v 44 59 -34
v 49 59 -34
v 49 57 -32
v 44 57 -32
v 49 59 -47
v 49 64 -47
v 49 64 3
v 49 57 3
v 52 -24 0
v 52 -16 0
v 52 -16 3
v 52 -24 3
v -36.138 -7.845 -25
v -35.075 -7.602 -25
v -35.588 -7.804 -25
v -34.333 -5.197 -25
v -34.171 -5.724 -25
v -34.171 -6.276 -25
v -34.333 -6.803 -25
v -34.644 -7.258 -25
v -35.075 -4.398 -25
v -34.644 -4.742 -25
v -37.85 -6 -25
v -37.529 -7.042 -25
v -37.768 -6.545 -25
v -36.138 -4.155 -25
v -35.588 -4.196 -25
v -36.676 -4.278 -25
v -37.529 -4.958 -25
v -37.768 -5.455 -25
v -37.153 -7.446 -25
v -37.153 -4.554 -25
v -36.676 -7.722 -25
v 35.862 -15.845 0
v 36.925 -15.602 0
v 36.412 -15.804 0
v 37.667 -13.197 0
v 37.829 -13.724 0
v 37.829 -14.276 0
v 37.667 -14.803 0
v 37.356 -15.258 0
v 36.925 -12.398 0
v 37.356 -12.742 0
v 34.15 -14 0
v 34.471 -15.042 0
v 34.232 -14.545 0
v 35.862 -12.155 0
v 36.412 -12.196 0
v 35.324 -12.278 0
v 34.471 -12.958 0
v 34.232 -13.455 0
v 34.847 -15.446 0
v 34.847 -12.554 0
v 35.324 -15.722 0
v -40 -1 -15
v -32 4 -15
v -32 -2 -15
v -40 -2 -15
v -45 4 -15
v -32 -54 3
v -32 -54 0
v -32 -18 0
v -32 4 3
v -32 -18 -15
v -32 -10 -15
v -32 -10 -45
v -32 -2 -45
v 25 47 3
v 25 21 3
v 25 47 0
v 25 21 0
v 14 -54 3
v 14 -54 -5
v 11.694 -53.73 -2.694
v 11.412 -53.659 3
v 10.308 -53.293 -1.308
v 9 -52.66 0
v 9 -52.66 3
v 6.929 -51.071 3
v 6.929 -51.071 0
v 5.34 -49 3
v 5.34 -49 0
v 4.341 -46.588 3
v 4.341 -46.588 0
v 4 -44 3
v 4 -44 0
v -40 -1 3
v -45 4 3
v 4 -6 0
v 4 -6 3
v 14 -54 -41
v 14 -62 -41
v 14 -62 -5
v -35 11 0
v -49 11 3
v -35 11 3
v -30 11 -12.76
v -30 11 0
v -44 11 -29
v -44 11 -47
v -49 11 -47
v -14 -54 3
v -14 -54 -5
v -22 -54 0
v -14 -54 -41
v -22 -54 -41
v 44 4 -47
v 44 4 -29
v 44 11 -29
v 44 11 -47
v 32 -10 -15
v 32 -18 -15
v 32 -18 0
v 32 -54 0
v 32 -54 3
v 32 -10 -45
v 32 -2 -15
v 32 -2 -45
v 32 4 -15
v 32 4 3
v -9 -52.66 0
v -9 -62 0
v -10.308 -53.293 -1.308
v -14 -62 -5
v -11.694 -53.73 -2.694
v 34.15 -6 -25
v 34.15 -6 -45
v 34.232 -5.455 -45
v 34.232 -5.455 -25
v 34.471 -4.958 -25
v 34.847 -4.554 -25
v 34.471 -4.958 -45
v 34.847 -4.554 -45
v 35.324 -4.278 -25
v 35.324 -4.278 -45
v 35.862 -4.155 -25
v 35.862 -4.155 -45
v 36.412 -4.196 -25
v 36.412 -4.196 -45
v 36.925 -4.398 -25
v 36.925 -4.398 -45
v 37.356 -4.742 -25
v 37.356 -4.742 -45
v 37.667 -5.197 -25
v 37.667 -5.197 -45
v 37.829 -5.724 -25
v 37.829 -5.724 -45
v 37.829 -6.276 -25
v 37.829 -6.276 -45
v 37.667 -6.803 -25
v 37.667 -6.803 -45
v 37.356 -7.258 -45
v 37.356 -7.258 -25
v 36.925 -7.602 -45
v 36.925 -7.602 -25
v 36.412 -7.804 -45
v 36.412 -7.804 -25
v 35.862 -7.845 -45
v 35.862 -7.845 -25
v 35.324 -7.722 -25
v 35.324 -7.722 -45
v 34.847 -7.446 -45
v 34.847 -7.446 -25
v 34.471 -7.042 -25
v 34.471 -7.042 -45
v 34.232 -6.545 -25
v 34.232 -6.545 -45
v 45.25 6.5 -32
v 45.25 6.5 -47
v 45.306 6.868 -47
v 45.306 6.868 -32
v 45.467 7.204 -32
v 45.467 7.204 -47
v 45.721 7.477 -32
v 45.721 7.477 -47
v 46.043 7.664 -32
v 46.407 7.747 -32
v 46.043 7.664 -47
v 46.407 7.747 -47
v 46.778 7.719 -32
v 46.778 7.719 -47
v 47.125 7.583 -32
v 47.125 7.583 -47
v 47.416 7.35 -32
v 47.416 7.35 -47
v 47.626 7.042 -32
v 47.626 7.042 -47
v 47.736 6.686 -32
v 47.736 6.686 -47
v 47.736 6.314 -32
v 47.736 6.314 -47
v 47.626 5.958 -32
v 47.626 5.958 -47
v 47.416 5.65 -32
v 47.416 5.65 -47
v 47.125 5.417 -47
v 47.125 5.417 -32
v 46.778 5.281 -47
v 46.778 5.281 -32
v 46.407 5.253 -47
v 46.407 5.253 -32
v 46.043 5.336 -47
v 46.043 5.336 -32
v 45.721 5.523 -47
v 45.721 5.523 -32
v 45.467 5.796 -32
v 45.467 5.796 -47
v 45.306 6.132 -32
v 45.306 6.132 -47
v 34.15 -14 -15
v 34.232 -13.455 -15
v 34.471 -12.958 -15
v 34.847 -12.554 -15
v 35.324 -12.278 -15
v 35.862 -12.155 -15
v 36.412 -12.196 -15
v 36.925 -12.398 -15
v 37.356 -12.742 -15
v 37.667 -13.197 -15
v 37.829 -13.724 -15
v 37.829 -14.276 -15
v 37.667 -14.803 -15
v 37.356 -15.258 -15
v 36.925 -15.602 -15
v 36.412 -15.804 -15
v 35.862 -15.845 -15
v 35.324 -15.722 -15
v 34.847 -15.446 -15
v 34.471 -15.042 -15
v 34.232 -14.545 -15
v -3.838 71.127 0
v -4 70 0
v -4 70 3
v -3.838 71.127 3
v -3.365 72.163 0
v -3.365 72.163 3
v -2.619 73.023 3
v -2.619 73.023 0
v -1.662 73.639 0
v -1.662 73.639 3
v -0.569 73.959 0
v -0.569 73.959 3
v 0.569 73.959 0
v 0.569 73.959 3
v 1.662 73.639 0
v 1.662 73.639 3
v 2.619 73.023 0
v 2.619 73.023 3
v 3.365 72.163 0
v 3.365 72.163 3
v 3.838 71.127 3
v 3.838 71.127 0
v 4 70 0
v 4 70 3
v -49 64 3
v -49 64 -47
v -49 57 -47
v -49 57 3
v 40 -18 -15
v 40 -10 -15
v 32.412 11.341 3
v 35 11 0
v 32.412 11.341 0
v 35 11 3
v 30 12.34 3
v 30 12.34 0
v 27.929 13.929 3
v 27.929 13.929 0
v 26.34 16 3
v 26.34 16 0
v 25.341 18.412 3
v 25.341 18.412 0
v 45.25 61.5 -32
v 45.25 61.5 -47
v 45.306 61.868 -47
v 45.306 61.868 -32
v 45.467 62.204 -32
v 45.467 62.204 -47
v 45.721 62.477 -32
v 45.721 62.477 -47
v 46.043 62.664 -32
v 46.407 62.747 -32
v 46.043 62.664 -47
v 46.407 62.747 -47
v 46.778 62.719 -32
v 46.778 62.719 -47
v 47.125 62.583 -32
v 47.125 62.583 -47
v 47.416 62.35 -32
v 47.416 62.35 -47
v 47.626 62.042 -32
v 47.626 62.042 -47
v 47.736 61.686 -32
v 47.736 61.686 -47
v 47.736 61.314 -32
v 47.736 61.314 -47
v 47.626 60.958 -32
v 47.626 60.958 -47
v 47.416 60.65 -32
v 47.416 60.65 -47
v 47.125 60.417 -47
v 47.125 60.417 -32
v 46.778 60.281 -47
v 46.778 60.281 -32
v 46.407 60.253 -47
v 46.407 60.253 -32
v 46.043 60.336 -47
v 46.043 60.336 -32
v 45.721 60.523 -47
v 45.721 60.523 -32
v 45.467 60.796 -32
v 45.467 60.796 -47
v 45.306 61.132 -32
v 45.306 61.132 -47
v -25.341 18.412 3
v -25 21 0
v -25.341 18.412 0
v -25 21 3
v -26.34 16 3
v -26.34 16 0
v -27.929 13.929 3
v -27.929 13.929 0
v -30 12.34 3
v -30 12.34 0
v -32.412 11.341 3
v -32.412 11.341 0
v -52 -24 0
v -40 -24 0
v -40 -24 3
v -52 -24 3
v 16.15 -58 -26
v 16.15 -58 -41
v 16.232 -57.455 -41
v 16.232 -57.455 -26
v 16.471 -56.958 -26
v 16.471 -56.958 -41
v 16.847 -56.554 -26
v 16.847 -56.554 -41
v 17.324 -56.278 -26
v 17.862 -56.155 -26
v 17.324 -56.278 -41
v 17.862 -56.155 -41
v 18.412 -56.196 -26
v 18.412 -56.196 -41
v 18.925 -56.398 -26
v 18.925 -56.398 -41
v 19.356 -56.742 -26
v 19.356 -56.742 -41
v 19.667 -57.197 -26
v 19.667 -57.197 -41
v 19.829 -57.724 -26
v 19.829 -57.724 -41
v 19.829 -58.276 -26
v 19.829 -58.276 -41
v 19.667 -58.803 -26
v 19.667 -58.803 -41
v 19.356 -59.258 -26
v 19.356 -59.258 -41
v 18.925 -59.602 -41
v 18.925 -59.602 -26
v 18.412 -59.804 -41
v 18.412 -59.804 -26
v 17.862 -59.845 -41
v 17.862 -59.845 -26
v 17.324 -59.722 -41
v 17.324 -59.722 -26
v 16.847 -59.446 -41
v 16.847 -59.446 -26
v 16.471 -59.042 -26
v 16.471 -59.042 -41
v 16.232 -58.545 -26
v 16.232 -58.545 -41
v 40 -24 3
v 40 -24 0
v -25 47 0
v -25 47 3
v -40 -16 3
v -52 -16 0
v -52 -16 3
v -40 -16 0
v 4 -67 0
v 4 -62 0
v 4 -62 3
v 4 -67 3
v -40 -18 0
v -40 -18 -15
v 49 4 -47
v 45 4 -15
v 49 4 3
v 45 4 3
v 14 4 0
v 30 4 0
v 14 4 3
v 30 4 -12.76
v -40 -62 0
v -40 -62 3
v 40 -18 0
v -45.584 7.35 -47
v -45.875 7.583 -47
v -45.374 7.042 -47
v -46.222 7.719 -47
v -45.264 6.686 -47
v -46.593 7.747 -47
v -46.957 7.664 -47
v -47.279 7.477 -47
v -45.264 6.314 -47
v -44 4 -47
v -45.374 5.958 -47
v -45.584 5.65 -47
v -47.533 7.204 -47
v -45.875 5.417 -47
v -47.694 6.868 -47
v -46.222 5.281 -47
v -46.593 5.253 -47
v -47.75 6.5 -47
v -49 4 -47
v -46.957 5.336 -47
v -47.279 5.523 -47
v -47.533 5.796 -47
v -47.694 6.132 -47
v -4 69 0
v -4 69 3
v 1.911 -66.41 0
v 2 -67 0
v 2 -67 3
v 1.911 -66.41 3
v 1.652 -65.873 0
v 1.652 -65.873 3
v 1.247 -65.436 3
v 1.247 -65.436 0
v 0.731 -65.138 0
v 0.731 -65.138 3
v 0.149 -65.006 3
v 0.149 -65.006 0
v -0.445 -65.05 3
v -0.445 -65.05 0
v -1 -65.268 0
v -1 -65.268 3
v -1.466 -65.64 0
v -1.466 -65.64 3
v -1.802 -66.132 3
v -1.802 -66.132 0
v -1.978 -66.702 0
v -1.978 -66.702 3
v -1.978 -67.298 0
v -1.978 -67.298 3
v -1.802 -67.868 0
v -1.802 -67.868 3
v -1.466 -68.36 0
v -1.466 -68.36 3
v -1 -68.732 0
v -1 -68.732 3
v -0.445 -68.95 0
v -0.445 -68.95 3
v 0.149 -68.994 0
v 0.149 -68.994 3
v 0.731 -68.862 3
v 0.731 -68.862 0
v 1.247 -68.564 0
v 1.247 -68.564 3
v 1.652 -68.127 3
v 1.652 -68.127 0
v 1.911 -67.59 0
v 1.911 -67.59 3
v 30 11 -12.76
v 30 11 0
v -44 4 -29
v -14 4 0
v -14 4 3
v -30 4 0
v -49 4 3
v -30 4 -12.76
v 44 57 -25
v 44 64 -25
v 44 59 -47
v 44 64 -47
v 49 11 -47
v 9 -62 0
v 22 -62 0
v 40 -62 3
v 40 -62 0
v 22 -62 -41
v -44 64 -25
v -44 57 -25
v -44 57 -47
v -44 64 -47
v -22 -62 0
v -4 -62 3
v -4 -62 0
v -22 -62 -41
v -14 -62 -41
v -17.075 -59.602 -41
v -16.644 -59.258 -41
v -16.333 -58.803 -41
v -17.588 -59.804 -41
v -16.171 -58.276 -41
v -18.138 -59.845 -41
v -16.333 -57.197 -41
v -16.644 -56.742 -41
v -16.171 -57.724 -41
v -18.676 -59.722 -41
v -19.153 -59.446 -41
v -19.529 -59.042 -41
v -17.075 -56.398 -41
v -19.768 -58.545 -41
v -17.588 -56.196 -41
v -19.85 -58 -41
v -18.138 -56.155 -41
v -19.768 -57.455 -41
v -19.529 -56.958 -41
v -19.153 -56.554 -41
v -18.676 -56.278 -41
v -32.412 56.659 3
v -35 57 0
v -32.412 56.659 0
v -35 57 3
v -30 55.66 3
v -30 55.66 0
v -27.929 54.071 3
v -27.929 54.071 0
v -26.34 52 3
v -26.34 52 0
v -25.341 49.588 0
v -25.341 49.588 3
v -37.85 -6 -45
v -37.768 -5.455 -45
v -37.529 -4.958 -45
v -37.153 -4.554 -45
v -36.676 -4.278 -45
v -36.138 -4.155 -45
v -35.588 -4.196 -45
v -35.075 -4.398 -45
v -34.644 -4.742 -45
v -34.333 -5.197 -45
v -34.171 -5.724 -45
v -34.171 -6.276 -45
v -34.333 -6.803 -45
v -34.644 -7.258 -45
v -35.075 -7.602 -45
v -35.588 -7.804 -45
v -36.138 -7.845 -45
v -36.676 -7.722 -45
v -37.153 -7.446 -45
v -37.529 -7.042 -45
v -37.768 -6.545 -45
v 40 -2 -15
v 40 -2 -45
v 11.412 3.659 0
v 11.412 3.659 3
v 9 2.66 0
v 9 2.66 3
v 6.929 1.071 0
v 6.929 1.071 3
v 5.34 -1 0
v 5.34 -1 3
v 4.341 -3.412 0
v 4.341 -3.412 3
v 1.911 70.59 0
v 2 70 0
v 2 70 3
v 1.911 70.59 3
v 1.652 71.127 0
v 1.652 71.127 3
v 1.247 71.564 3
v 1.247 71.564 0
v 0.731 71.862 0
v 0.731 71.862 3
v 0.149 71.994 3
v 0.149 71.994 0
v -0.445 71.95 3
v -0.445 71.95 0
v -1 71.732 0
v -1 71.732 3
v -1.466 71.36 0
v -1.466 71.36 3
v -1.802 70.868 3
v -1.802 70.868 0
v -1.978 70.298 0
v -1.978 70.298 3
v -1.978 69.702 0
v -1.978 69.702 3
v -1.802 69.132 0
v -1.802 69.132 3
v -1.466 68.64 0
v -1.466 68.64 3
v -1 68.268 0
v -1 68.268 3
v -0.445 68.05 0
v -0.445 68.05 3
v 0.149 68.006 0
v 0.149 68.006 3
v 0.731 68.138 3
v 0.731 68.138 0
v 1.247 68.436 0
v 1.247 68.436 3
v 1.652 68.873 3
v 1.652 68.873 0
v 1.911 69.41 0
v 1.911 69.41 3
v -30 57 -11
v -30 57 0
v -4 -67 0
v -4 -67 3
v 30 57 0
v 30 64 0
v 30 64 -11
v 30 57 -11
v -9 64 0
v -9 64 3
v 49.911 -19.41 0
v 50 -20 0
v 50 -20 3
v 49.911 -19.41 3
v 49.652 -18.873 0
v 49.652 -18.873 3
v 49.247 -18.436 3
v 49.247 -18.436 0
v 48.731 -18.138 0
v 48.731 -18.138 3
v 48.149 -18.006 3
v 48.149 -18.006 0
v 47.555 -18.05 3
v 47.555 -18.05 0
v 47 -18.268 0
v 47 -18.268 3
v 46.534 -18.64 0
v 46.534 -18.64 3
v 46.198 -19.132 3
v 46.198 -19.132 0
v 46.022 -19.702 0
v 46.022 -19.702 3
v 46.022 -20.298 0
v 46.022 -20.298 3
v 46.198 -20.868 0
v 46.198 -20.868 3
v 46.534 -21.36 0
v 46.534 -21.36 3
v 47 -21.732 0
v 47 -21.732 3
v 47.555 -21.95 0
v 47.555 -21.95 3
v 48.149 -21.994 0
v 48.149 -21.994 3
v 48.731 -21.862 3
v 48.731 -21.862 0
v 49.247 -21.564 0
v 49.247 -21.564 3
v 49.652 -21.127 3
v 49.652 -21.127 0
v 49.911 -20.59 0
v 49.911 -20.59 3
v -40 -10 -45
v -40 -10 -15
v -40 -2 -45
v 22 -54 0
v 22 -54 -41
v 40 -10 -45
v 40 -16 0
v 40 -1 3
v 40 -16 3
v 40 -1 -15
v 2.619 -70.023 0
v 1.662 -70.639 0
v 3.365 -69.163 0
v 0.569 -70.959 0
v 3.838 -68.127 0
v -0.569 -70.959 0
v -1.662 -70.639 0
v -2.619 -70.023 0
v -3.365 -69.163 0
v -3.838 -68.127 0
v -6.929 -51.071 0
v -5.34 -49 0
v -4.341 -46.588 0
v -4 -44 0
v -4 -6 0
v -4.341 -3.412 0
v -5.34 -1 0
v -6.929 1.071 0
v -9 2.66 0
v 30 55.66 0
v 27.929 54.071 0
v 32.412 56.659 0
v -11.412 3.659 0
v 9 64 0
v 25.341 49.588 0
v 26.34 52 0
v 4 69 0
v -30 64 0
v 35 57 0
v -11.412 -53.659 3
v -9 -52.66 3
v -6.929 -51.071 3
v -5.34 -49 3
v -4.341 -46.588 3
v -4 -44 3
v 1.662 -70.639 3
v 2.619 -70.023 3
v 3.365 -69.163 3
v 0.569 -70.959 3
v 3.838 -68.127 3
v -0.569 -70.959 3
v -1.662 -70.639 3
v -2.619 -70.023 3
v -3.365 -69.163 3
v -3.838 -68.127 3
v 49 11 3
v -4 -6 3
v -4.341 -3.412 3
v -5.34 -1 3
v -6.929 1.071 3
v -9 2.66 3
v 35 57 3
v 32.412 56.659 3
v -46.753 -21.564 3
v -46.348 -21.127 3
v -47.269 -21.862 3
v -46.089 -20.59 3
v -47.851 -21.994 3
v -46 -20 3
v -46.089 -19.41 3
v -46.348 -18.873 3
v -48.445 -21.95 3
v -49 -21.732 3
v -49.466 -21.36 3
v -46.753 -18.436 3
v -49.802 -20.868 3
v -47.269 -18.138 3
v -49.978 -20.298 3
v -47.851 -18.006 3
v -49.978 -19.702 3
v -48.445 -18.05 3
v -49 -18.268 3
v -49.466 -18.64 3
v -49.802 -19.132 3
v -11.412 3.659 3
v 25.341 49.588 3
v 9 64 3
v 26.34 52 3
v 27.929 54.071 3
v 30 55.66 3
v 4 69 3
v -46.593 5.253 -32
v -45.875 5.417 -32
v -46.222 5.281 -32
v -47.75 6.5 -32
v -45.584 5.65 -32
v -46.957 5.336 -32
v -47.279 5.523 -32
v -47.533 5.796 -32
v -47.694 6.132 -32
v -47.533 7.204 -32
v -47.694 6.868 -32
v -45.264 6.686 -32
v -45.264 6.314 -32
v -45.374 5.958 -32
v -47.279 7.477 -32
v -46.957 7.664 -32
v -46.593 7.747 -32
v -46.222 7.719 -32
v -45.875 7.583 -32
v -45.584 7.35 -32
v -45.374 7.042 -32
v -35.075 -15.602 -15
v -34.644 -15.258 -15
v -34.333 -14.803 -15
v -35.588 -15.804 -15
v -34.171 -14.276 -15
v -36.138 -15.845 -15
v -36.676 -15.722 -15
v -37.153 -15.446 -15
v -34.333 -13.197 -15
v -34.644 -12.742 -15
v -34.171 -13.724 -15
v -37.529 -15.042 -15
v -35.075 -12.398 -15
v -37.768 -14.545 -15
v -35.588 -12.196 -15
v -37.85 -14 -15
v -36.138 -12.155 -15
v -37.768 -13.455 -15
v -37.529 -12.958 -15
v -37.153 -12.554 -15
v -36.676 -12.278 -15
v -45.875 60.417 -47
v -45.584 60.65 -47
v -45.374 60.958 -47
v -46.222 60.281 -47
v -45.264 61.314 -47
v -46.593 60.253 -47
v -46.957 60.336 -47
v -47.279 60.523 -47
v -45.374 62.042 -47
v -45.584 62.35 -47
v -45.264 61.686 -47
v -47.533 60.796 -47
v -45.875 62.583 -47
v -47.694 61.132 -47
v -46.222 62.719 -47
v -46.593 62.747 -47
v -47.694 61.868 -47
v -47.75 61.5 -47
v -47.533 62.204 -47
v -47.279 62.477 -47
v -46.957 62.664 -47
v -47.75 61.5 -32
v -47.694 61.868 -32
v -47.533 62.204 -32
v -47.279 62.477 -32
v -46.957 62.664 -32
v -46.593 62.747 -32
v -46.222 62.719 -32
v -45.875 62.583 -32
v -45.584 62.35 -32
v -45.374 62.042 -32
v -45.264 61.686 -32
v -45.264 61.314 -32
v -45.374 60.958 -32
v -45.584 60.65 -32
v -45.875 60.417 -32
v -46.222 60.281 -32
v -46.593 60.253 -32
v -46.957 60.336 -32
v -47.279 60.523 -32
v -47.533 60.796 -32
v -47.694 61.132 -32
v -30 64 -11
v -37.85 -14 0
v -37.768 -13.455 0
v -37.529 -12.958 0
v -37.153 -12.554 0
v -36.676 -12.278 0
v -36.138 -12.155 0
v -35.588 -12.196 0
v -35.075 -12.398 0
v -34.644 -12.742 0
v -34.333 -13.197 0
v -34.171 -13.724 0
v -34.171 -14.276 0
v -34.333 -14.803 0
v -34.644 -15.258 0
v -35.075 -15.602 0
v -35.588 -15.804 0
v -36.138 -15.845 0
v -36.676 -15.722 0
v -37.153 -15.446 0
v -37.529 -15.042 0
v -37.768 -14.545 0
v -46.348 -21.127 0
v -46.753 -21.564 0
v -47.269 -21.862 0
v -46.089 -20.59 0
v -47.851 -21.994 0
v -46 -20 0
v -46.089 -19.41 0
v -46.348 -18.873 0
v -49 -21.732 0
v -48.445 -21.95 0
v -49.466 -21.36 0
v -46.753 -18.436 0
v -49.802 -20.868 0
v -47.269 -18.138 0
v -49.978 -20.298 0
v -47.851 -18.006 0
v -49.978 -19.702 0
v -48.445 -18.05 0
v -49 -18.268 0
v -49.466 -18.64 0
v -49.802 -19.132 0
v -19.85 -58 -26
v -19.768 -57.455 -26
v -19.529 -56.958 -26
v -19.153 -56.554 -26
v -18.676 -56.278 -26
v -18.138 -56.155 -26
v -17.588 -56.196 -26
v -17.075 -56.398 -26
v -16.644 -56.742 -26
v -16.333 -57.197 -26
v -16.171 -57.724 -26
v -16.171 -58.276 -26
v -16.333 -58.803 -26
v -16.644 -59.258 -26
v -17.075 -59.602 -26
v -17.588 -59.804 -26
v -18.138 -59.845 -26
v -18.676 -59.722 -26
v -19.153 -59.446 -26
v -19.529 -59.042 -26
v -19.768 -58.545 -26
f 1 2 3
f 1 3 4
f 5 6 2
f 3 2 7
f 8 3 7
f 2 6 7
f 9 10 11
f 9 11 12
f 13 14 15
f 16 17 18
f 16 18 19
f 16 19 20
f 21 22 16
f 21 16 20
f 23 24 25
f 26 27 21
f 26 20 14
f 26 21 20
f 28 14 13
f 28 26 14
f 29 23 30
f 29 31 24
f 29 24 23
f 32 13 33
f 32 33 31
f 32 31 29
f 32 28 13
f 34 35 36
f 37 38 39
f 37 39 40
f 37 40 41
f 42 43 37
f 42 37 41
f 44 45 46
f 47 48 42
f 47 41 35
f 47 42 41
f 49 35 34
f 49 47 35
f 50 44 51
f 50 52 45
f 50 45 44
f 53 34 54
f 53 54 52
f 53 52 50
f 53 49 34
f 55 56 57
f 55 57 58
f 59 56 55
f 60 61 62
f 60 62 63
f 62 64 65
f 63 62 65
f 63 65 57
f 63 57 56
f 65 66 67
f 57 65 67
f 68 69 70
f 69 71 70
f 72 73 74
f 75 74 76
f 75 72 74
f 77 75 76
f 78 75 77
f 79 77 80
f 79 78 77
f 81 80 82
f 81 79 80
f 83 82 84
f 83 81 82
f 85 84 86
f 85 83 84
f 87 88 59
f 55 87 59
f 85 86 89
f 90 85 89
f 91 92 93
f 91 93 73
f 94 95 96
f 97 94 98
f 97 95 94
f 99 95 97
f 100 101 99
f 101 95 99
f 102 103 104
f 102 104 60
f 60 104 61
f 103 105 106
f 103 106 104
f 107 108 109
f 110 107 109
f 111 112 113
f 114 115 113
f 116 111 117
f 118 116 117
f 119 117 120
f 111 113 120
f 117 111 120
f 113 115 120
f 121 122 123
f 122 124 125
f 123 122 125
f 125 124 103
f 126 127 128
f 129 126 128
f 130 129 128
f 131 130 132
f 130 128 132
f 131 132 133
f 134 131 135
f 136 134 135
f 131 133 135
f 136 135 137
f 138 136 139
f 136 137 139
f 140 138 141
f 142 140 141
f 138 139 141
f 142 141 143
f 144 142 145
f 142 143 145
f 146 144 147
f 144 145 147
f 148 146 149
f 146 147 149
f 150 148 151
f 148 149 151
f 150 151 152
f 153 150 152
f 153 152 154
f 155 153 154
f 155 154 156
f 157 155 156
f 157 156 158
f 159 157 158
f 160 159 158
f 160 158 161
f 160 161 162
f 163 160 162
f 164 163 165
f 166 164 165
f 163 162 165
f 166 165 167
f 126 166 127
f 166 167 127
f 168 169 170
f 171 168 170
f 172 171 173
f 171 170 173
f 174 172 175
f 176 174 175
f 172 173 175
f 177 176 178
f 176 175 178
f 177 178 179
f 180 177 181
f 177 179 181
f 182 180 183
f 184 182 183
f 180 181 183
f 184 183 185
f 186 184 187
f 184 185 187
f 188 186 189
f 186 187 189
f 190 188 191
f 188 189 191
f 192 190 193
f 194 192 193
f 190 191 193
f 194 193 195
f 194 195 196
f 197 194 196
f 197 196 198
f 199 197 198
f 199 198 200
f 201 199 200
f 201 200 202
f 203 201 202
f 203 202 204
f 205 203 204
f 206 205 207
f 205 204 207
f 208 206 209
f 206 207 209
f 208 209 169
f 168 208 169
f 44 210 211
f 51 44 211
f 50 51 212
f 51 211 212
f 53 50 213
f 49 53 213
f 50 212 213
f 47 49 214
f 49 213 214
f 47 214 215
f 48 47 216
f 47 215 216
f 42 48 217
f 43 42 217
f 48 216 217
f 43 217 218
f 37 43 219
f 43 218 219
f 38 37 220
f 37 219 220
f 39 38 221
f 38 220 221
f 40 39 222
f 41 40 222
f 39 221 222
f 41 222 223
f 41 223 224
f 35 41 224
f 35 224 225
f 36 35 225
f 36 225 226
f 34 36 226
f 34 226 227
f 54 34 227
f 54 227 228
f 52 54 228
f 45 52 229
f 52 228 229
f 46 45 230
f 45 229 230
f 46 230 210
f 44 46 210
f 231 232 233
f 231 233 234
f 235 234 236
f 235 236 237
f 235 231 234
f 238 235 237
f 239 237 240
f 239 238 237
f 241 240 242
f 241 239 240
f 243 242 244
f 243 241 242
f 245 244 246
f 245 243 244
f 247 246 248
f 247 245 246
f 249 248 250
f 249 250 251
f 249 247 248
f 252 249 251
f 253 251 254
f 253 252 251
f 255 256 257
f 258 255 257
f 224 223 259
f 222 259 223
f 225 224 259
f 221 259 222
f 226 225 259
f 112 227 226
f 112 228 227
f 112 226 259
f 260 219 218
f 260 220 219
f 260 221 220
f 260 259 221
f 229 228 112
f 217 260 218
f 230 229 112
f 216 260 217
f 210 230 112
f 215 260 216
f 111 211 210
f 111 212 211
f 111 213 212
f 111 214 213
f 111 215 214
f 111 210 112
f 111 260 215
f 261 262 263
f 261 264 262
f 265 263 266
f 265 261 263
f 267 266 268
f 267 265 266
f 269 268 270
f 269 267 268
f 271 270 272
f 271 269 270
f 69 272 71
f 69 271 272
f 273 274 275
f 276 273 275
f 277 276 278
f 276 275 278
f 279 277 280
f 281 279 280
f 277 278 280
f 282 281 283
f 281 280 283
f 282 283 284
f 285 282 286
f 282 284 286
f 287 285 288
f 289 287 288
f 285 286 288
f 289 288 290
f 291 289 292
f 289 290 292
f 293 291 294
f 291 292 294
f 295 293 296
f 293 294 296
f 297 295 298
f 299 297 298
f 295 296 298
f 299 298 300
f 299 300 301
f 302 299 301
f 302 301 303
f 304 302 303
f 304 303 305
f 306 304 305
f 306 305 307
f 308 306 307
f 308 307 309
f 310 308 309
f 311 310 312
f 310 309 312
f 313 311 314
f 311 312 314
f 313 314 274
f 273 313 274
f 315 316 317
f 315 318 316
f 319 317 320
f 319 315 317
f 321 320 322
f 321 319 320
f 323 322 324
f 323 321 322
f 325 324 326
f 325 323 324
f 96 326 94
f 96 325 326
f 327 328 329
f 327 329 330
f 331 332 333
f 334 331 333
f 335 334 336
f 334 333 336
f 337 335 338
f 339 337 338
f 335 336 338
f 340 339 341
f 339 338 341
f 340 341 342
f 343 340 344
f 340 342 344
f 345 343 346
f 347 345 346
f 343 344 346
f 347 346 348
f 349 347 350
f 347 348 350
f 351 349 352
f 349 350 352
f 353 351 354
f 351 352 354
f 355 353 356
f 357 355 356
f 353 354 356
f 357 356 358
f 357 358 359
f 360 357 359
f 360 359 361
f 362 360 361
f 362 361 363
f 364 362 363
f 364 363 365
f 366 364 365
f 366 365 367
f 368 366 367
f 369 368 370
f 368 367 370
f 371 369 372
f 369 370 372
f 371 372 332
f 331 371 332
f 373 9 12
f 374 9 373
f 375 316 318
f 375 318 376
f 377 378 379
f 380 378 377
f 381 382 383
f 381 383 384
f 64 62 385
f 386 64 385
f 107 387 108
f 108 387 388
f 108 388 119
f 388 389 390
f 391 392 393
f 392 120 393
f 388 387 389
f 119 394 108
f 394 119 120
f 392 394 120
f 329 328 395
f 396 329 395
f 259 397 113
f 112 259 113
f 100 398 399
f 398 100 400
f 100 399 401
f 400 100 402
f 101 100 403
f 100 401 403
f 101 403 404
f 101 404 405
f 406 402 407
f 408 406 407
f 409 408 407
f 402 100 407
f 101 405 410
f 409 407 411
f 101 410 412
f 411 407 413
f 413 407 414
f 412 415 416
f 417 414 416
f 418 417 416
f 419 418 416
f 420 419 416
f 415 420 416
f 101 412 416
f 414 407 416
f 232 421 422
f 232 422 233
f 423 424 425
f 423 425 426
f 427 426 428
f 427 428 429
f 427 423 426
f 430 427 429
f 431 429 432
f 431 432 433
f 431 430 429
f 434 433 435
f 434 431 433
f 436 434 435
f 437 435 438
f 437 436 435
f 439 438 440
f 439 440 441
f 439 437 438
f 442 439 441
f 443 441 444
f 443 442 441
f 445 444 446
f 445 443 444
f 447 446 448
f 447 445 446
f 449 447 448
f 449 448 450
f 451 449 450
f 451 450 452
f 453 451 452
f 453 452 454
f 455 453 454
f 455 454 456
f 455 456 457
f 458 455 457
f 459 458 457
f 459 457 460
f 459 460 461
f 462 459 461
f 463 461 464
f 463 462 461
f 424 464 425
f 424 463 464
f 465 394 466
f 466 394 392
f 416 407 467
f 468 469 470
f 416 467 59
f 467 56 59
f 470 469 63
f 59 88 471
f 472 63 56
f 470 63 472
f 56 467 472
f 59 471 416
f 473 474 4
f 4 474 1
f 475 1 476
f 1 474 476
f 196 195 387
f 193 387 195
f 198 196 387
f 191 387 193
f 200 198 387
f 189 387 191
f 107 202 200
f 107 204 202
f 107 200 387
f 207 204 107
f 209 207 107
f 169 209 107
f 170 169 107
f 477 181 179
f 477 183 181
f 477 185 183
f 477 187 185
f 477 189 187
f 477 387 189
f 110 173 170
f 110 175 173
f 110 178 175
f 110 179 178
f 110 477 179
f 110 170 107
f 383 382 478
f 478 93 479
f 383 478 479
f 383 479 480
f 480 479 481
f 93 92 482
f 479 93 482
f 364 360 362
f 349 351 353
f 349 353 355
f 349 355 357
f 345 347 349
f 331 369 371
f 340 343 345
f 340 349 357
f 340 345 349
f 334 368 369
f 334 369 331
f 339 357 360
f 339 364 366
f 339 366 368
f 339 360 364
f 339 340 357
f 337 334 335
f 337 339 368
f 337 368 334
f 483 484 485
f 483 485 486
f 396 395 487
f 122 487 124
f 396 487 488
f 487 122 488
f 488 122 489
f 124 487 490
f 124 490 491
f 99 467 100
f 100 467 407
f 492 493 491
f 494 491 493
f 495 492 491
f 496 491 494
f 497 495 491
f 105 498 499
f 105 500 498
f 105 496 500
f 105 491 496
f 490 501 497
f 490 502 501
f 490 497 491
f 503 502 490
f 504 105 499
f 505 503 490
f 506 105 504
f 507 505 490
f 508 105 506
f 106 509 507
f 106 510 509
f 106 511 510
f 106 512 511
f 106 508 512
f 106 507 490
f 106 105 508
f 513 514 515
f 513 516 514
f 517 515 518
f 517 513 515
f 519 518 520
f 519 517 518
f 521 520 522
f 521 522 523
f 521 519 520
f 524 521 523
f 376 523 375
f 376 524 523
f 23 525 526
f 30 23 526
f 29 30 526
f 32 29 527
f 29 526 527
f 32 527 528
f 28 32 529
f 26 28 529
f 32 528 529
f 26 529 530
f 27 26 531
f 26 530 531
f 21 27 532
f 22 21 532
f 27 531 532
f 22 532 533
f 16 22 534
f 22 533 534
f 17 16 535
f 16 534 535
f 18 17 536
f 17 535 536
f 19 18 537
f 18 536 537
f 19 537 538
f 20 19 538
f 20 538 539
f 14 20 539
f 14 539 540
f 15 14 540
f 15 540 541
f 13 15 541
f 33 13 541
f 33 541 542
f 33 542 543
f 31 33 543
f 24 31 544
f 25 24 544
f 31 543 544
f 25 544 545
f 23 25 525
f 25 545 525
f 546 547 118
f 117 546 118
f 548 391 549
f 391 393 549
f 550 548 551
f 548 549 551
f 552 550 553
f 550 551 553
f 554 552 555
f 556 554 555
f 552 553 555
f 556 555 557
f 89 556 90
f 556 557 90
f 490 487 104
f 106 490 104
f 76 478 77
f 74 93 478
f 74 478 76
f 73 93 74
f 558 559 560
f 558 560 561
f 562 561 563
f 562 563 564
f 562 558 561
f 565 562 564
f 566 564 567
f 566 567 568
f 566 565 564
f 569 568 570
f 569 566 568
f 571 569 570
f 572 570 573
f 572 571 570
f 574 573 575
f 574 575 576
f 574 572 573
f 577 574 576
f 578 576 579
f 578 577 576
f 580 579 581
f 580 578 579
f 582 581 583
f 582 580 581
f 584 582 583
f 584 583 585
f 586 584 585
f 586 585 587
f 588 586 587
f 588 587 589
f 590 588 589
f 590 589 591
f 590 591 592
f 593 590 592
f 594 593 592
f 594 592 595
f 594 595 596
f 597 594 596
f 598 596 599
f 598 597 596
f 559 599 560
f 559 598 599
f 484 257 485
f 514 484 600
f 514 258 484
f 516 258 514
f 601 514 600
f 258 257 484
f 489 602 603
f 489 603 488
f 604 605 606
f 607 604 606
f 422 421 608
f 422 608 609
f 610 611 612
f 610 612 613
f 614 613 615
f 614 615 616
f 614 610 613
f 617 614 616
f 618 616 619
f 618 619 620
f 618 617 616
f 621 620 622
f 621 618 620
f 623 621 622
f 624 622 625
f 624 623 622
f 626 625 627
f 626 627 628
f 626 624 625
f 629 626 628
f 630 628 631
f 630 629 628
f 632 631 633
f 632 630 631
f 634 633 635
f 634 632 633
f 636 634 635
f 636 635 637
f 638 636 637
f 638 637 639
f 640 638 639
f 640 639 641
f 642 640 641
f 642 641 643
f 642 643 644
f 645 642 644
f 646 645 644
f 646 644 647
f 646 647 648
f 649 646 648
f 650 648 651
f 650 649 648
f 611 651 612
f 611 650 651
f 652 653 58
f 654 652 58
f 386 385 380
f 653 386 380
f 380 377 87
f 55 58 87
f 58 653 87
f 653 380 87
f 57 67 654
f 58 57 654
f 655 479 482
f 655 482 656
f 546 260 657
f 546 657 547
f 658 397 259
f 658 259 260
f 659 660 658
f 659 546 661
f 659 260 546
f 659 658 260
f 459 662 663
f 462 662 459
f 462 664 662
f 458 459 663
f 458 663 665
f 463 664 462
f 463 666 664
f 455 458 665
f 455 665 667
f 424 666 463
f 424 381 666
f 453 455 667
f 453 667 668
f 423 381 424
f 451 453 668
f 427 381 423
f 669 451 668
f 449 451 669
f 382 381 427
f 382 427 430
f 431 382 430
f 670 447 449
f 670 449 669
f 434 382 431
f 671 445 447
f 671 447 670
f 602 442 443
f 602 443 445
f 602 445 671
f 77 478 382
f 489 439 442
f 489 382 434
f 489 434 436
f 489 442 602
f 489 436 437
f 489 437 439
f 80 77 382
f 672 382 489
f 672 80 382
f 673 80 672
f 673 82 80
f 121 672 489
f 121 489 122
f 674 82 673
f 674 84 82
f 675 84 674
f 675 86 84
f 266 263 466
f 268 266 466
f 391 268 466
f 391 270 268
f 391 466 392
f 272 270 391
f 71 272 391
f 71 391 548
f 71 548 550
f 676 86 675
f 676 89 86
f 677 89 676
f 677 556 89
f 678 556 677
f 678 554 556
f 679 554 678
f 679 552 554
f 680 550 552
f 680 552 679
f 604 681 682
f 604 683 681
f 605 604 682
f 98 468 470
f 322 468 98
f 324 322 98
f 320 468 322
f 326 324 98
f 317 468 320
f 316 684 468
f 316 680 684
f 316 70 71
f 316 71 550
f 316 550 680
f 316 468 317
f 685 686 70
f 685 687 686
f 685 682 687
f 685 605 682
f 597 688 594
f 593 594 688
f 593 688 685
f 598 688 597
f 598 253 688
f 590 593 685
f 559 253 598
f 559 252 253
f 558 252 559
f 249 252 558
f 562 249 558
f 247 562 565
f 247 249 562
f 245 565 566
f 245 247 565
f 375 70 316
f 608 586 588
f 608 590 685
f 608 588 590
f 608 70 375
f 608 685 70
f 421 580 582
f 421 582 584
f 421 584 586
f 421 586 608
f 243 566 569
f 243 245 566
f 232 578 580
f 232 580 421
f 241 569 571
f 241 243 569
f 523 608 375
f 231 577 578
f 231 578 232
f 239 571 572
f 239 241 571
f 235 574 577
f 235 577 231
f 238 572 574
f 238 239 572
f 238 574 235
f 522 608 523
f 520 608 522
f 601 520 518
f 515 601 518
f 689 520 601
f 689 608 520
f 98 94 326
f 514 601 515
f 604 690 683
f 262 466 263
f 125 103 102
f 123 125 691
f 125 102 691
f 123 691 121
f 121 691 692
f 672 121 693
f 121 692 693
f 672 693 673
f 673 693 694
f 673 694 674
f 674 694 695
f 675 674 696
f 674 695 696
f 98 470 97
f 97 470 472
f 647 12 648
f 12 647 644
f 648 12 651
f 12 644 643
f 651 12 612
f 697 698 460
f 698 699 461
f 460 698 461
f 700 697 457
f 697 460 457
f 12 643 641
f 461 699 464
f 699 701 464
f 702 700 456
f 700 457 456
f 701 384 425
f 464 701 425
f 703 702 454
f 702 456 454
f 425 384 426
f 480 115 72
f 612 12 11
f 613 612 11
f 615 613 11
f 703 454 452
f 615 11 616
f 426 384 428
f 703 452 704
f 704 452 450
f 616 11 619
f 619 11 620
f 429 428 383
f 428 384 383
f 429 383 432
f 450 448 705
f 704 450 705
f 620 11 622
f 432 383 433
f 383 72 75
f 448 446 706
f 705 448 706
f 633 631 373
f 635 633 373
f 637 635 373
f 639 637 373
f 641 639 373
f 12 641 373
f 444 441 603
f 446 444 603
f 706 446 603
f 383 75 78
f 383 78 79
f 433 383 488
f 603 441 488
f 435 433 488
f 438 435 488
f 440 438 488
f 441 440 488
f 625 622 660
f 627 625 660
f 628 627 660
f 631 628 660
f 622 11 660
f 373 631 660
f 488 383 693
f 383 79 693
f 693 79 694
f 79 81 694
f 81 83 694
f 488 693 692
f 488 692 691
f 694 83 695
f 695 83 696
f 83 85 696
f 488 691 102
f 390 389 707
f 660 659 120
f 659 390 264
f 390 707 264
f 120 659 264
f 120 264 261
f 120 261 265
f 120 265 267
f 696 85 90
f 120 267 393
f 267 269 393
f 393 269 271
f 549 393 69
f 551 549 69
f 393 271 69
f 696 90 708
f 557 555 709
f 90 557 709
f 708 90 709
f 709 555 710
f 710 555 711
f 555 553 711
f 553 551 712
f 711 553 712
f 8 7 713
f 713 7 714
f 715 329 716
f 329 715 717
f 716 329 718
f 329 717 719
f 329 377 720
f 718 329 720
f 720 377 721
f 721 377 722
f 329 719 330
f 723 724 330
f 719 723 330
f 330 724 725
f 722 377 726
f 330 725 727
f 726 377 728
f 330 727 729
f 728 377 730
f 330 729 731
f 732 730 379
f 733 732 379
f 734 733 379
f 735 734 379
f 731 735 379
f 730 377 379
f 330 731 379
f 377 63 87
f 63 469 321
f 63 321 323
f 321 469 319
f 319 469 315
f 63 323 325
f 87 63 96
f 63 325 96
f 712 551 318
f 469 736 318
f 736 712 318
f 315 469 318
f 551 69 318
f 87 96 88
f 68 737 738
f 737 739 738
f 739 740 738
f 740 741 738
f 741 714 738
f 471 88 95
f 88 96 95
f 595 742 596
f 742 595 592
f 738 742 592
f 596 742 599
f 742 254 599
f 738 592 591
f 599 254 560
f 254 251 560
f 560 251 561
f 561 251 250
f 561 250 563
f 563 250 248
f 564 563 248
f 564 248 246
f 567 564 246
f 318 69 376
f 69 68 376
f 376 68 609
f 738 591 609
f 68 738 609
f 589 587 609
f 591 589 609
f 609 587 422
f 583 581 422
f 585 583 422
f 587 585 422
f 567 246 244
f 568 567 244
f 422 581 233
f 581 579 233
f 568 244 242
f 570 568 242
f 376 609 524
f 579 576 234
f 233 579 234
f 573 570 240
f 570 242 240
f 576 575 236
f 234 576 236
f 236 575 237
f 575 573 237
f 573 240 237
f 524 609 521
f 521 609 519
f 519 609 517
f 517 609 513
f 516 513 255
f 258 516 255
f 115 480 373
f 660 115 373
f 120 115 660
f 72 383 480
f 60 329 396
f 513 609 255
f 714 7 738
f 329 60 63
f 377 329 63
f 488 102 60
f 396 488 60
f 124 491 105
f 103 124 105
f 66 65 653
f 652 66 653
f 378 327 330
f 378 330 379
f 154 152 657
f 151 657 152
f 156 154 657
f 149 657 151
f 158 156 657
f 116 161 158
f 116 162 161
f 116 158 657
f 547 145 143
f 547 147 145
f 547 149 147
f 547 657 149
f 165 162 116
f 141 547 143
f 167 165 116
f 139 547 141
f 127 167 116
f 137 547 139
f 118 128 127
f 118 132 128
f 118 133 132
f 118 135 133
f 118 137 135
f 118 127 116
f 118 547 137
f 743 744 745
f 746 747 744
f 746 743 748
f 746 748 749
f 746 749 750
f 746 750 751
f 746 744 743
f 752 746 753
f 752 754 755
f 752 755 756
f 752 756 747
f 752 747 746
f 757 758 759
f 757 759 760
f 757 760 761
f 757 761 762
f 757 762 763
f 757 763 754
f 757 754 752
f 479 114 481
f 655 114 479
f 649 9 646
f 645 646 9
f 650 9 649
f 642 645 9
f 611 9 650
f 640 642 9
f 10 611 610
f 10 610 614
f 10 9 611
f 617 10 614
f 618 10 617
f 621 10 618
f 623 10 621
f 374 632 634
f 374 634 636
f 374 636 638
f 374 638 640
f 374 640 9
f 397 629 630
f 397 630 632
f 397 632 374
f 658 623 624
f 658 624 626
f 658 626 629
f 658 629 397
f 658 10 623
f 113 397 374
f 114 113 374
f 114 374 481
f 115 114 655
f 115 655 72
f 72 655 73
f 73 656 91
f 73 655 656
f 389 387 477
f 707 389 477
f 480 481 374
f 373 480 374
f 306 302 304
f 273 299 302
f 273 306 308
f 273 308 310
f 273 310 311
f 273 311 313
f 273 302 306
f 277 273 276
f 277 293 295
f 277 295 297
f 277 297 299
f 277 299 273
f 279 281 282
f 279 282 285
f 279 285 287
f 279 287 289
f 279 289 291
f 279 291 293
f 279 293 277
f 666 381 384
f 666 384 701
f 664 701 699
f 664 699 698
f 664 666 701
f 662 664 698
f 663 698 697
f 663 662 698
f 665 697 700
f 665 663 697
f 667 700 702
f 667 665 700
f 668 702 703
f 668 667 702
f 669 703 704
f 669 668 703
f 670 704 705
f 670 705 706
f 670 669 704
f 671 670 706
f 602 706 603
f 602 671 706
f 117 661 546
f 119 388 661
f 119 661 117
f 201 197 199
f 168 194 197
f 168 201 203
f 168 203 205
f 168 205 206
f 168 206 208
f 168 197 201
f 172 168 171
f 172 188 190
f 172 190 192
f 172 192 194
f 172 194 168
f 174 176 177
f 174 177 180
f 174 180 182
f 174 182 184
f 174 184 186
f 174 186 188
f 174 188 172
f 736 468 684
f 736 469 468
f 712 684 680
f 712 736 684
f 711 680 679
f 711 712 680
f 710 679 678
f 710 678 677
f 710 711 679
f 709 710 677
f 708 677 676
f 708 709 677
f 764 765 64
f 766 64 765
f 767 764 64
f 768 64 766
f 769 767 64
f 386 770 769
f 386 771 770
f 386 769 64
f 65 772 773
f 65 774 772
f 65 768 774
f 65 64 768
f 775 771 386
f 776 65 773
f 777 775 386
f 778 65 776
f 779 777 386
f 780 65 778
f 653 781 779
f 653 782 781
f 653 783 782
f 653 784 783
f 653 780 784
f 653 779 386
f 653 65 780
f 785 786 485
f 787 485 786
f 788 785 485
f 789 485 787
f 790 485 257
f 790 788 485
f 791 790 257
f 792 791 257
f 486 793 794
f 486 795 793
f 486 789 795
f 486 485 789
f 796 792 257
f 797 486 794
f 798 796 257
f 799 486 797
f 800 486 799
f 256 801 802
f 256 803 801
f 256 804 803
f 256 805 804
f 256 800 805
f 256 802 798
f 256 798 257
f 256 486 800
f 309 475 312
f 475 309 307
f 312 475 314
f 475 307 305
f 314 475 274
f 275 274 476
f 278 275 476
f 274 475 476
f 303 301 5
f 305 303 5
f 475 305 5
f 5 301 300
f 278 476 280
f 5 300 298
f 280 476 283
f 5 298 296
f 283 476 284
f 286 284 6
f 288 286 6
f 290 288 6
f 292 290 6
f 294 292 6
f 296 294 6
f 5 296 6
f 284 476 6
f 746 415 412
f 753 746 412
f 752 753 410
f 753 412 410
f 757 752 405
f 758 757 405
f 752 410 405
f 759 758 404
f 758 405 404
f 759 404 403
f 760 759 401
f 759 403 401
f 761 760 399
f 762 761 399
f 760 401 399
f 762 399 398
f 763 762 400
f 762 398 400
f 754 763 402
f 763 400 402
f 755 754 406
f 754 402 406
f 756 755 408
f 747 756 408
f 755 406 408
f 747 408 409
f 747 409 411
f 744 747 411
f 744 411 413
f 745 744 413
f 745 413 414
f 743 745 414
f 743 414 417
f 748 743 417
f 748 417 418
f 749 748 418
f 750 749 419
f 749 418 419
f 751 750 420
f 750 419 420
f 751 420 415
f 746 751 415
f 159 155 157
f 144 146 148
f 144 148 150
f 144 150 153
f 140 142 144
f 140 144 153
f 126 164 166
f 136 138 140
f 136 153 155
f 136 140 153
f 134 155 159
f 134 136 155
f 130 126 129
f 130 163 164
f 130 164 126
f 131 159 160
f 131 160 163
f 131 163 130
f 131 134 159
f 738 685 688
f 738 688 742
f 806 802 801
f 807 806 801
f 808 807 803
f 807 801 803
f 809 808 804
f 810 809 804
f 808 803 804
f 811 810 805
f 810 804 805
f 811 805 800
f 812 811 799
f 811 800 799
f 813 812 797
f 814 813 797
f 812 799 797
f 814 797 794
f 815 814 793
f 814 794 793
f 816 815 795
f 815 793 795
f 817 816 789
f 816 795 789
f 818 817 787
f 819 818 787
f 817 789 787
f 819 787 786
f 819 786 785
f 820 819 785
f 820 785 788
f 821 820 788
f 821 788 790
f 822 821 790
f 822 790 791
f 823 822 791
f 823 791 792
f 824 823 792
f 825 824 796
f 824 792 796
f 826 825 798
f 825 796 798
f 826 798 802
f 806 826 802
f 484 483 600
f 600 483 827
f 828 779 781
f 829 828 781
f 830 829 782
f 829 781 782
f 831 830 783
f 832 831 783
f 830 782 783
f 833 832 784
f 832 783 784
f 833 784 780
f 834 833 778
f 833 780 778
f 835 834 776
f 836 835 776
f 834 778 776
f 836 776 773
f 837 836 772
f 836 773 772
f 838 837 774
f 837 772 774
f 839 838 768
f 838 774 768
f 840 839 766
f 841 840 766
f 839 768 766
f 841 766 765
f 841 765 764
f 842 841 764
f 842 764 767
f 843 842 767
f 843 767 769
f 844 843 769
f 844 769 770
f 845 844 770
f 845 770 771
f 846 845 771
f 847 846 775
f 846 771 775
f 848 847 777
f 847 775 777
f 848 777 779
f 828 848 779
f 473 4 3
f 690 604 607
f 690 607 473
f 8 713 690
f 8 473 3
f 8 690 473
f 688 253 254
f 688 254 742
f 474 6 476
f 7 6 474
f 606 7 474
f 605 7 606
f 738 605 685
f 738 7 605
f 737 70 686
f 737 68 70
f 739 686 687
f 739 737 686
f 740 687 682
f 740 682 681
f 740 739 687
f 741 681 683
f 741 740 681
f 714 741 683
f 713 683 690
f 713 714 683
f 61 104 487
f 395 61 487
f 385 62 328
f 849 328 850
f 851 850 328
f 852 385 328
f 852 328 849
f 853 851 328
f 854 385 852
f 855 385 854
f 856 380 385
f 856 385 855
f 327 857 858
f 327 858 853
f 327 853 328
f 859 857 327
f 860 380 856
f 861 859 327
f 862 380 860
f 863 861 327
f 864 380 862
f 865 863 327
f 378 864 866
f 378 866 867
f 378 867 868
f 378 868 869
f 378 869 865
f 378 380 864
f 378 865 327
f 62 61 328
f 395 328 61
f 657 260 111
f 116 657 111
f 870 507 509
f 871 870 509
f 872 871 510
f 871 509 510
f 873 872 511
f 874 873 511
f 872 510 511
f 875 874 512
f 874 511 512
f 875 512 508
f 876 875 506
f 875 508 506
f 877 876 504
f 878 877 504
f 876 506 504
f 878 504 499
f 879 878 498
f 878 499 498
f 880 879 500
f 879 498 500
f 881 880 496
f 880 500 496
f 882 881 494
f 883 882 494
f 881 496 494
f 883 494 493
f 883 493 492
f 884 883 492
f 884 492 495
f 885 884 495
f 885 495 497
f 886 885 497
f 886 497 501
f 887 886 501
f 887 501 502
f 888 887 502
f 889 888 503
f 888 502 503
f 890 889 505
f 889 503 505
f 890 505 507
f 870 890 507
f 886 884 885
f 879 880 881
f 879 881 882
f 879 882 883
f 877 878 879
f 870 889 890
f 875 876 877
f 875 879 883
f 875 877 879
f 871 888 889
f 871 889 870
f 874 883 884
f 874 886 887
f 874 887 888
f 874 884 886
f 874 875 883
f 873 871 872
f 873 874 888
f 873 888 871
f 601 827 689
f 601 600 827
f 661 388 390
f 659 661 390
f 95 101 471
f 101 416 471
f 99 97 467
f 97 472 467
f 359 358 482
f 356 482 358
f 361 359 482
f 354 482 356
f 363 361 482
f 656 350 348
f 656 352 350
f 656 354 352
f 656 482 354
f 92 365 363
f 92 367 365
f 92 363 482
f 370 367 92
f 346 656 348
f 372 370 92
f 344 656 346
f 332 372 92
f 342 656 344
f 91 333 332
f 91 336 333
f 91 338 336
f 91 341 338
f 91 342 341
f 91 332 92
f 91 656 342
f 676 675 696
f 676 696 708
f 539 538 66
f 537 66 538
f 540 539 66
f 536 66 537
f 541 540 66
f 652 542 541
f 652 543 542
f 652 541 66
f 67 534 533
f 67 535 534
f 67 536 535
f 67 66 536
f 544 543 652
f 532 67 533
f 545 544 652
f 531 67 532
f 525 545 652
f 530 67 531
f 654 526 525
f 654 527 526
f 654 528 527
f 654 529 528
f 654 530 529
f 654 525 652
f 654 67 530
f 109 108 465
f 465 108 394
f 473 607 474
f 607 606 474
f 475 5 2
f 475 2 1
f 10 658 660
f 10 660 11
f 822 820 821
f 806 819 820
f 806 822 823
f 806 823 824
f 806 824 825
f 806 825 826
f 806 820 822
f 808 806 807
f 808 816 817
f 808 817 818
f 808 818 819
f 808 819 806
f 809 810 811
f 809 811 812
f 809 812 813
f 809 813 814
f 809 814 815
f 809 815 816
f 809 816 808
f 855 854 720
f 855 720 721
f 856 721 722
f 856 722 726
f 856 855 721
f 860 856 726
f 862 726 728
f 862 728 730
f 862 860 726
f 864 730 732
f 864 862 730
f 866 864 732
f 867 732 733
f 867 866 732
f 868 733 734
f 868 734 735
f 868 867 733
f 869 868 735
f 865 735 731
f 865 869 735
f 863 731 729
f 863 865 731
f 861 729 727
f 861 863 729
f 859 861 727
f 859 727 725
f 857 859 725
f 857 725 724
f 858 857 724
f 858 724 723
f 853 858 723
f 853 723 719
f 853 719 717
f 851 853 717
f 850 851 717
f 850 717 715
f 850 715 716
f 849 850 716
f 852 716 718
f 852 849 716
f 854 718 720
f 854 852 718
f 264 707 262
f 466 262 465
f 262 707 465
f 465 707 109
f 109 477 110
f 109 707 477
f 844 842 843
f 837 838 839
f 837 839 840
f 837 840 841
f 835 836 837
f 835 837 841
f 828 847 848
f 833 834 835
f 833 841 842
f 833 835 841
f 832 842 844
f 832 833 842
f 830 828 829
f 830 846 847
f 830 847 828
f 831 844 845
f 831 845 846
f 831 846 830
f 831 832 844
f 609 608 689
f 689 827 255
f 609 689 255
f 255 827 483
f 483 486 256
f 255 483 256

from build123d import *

# Parameters (mm, degrees)
SCHIZZO1_R                    = 2
ESTRUSIONE_ESTRUSIONE1_DEPTH  = 3
ESTRUSIONE_ESTRUSIONE2_DEPTH  = 3
SCHIZZO3_W                    = 5
SCHIZZO3_H                    = 5
ESTRUSIONE_ESTRUSIONE3_DEPTH  = 47
SCHIZZO4_R                    = 1.25
TAGLIO_ESTRUSIONE1_DEPTH      = 15
ESTRUSIONE_ESTRUSIONE4_DEPTH  = 5
ESTRUSIONE_ESTRUSIONE5_DEPTH  = 5
SCHIZZO9_W                    = 50
SCHIZZO9_H                    = 46
ESTRUSIONE_ESTRUSIONE8_DEPTH  = 3
SMUSSO1_SIZE                  = 5
SCHIZZO11_W                   = 17
SCHIZZO11_H                   = 46
SCHIZZO11_W_2                 = 64
SCHIZZO11_H_2                 = 58
TAGLIO_ESTRUSIONE3_DEPTH      = 10
SCHIZZO12_W                   = 60
SCHIZZO12_H                   = 20
TAGLIO_ESTRUSIONE4_DEPTH      = 60
SCHIZZO13_W                   = 27
SCHIZZO13_H                   = 46
TAGLIO_ESTRUSIONE5_DEPTH      = 10
RACCORDO1_R                   = 10
SCHIZZO14_W                   = 8
SCHIZZO14_H                   = 14
ESTRUSIONE_ESTRUSIONE9_DEPTH  = 45
SCHIZZO15_R                   = 1.85
TAGLIO_ESTRUSIONE6_DEPTH      = 20
SCHIZZO16_W                   = 8
SCHIZZO16_H                   = 8
ESTRUSIONE_ESTRUSIONE10_DEPTH = 15
SCHIZZO17_R                   = 1.85
TAGLIO_ESTRUSIONE7_DEPTH      = 15
SCHIZZO18_W                   = 8
SCHIZZO18_H                   = 8
ESTRUSIONE_ESTRUSIONE11_DEPTH = 41
SMUSSO3_SIZE                  = 5
SCHIZZO19_W                   = 8
SCHIZZO19_H                   = 58
ESTRUSIONE_ESTRUSIONE12_DEPTH = 3
RACCORDO2_R                   = 10
SCHIZZO20_R                   = 1.85
TAGLIO_ESTRUSIONE8_DEPTH      = 15
SCHIZZO21_W                   = 80
SCHIZZO21_H                   = 6
TAGLIO_ESTRUSIONE9_DEPTH      = 30
SMUSSO4_SIZE                  = 5
ESTRUSIONE_ESTRUSIONE13_DEPTH = 2
SCHIZZO23_W                   = 5
SCHIZZO23_H                   = 2
TAGLIO_ESTRUSIONE10_DEPTH     = 15
SMUSSO5_SIZE                  = 2
ESTRUSIONE_ESTRUSIONE14_DEPTH = 2


with BuildPart() as part:
    # Schizzo1 → Estrusione-Estrusione1 (new body)
    with BuildSketch(Plane.XY):
        with BuildLine():
            Line((4, 70), (4, 27))
            Line((4, 27), (52, 27))
            Line((52, 27), (52, 18))
            Line((52, 18), (4, 18))
            Line((4, 18), (4, -16))
            Line((4, -16), (52, -16))
            Line((52, -16), (52, -24))
            Line((52, -24), (4, -24))
            Line((4, -24), (4, -67))
            ThreePointArc((4, -67), (0, -71), (-4, -67))
            Line((-4, -67), (-4, -24))
            Line((-4, -24), (-52, -24))
            Line((-52, -24), (-52, -16))
            Line((-52, -16), (-4, -16))
            Line((-4, -16), (-4, 18))
            Line((-4, 18), (-52, 18))
            Line((-52, 18), (-52, 27))
            Line((-52, 27), (-4, 27))
            Line((-4, 27), (-4, 70))
            ThreePointArc((-4, 70), (0, 74), (4, 70))
        make_face()
        with Locations((0, 70)):
            Circle(SCHIZZO1_R, mode=Mode.SUBTRACT)
        with Locations((48, 23)):
            Circle(SCHIZZO1_R, mode=Mode.SUBTRACT)
        with Locations((-48, 23)):
            Circle(SCHIZZO1_R, mode=Mode.SUBTRACT)
        with Locations((0, -67)):
            Circle(SCHIZZO1_R, mode=Mode.SUBTRACT)
        with Locations((-48, -20)):
            Circle(SCHIZZO1_R, mode=Mode.SUBTRACT)
        with Locations((48, -20)):
            Circle(SCHIZZO1_R, mode=Mode.SUBTRACT)
    extrude(amount=ESTRUSIONE_ESTRUSIONE1_DEPTH)

    # Schizzo2 → Estrusione-Estrusione2 (add)
    with BuildSketch(Plane.XY):
        Polygon((-42, 57), (-3.921210291, 57), (-3.921210291, 64), (-49, 64), (-49, 26), (-42, 26), align=None)
        Polygon((-49, 4), (-40, 4), (-40, -62), (40, -62), (40, 4), (49, 4), (49, 18), (42, 18), (42, 11), (3.990161704, 11), (3.990161704, 4), (32, 4), (32, -54), (-32, -54), (-32, 4), (-3.921210291, 4), (-3.921210291, 11), (-42, 11), (-42, 18), (-49, 18), align=None)
        Polygon((49, 64), (49, 26), (42, 26), (42, 57), (3.990161704, 57), (3.990161704, 64), align=None)
    extrude(amount=ESTRUSIONE_ESTRUSIONE2_DEPTH)

    # Schizzo3 → Estrusione-Estrusione3 (add)
    with BuildSketch(Plane(origin=(0, 0, 0), x_dir=(-1, 0, 0), z_dir=(0, 0, -1))):
        with Locations((-46.5, 61.5)):
            Rectangle(SCHIZZO3_W, SCHIZZO3_H)
        with Locations((46.5, 61.5)):
            Rectangle(SCHIZZO3_W, SCHIZZO3_H)
        with Locations((46.5, 6.5)):
            Rectangle(SCHIZZO3_W, SCHIZZO3_H)
        with Locations((-46.5, 6.5)):
            Rectangle(SCHIZZO3_W, SCHIZZO3_H)
    extrude(amount=ESTRUSIONE_ESTRUSIONE3_DEPTH)

    # Schizzo4 → Taglio-Estrusione1 (cut)
    with BuildSketch(Plane(origin=(0, 0, -47), x_dir=(-1, 0, 0), z_dir=(0, 0, -1))):
        with Locations((-46.5, 61.5)):
            Circle(SCHIZZO4_R)
        with Locations((46.5, 61.5)):
            Circle(SCHIZZO4_R)
        with Locations((46.5, 6.5)):
            Circle(SCHIZZO4_R)
        with Locations((-46.5, 6.5)):
            Circle(SCHIZZO4_R)
    extrude(amount=-TAGLIO_ESTRUSIONE1_DEPTH, mode=Mode.SUBTRACT)

    # Schizzo5 → Estrusione-Estrusione4 (add)
    with BuildSketch(Plane.XZ.offset(-4)):
        Polygon((-44, 0), (-19, 0), (-44, -29), align=None)
        Polygon((19, 0), (44, 0), (44, -29), align=None)
    extrude(amount=-ESTRUSIONE_ESTRUSIONE4_DEPTH)

    # Schizzo6 → Estrusione-Estrusione5 (add)
    with BuildSketch(Plane(origin=(0, 64, 0), x_dir=(1, 0, 0), z_dir=(0, 1, 0))):
        Polygon((-44, 25), (-19, 0), (-44, 0), align=None)
        Polygon((44, 25), (19, 0), (44, 0), align=None)
    extrude(amount=-ESTRUSIONE_ESTRUSIONE5_DEPTH)

    # Schizzo9 → Estrusione-Estrusione8 (add)
    with BuildSketch(Plane(origin=(0, 0, 0), x_dir=(-1, 0, 0), z_dir=(0, 0, -1))):
        with Locations((0, 34)):
            Rectangle(SCHIZZO9_W, SCHIZZO9_H)
    extrude(amount=-ESTRUSIONE_ESTRUSIONE8_DEPTH)

    # Smusso1
    smusso1_edges = [part.edges().sort_by_distance(p)[0] for p in [
        (4, 64, 1.5),
        (-4, 64, 1.5),
    ]]
    chamfer(smusso1_edges, length=SMUSSO1_SIZE)

    # Schizzo11 → Taglio-Estrusione3 (cut)
    with BuildSketch(Plane(origin=(0, 0, 0), x_dir=(-1, 0, 0), z_dir=(0, 0, -1))):
        with Locations((-33.5, 34)):
            Rectangle(SCHIZZO11_W, SCHIZZO11_H)
        with Locations((33.5, 34)):
            Rectangle(SCHIZZO11_W, SCHIZZO11_H)
        with Locations((0, -25)):
            Rectangle(SCHIZZO11_W_2, SCHIZZO11_H_2)
    extrude(amount=-TAGLIO_ESTRUSIONE3_DEPTH, mode=Mode.SUBTRACT)

    # Schizzo12 → Taglio-Estrusione4 (cut)
    with BuildSketch(Plane.XZ.offset(-4)):
        with Locations((0, -10)):
            Rectangle(SCHIZZO12_W, SCHIZZO12_H)
    extrude(amount=-TAGLIO_ESTRUSIONE4_DEPTH, mode=Mode.SUBTRACT)

    # Schizzo13 → Taglio-Estrusione5 (cut)
    with BuildSketch(Plane(origin=(0, 0, 0), x_dir=(-1, 0, 0), z_dir=(0, 0, -1))):
        with Locations((38.5, 34)):
            Rectangle(SCHIZZO13_W, SCHIZZO13_H)
        with Locations((-38.5, 34)):
            Rectangle(SCHIZZO13_W, SCHIZZO13_H)
    extrude(amount=-TAGLIO_ESTRUSIONE5_DEPTH, mode=Mode.SUBTRACT)

    # Raccordo1
    raccordo1_edges = [part.edges().sort_by_distance(p)[0] for p in [
        (25, 57, 1.5),
        (-25, 11, 1.5),
        (-25, 57, 1.5),
        (25, 11, 1.5),
    ]]
    fillet(raccordo1_edges, radius=RACCORDO1_R)

    # Schizzo14 → Estrusione-Estrusione9 (add)
    with BuildSketch(Plane(origin=(0, 0, 0), x_dir=(-1, 0, 0), z_dir=(0, 0, -1))):
        with Locations((-36, -3)):
            Rectangle(SCHIZZO14_W, SCHIZZO14_H)
        with Locations((36, -3)):
            Rectangle(SCHIZZO14_W, SCHIZZO14_H)
    extrude(amount=ESTRUSIONE_ESTRUSIONE9_DEPTH)

    # Schizzo15 → Taglio-Estrusione6 (cut)
    with BuildSketch(Plane(origin=(0, 0, -45), x_dir=(-1, 0, 0), z_dir=(0, 0, -1))):
        with Locations((36, -6)):
            Circle(SCHIZZO15_R)
        with Locations((-36, -6)):
            Circle(SCHIZZO15_R)
    extrude(amount=-TAGLIO_ESTRUSIONE6_DEPTH, mode=Mode.SUBTRACT)

    # Schizzo16 → Estrusione-Estrusione10 (add)
    with BuildSketch(Plane(origin=(0, 0, 0), x_dir=(-1, 0, 0), z_dir=(0, 0, -1))):
        with Locations((-36, -14)):
            Rectangle(SCHIZZO16_W, SCHIZZO16_H)
        with Locations((36, -14)):
            Rectangle(SCHIZZO16_W, SCHIZZO16_H)
    extrude(amount=ESTRUSIONE_ESTRUSIONE10_DEPTH)

    # Schizzo17 → Taglio-Estrusione7 (cut)
    with BuildSketch(Plane(origin=(0, 0, -15), x_dir=(-1, 0, 0), z_dir=(0, 0, -1))):
        with Locations((-36, -14)):
            Circle(SCHIZZO17_R)
        with Locations((36, -14)):
            Circle(SCHIZZO17_R)
    extrude(amount=-TAGLIO_ESTRUSIONE7_DEPTH, mode=Mode.SUBTRACT)

    # Schizzo18 → Estrusione-Estrusione11 (add)
    with BuildSketch(Plane(origin=(0, 0, 0), x_dir=(-1, 0, 0), z_dir=(0, 0, -1))):
        with Locations((-18, -58)):
            Rectangle(SCHIZZO18_W, SCHIZZO18_H)
        with Locations((18, -58)):
            Rectangle(SCHIZZO18_W, SCHIZZO18_H)
    extrude(amount=ESTRUSIONE_ESTRUSIONE11_DEPTH)

    # Smusso3
    smusso3_edges = [part.edges().sort_by_distance(p)[0] for p in [
        (14, -58, 0),
        (-14, -58, 0),
    ]]
    chamfer(smusso3_edges, length=SMUSSO3_SIZE)

    # Schizzo19 → Estrusione-Estrusione12 (add)
    with BuildSketch(Plane(origin=(0, 0, 0), x_dir=(-1, 0, 0), z_dir=(0, 0, -1))):
        with Locations((0, -25)):
            Rectangle(SCHIZZO19_W, SCHIZZO19_H)
    extrude(amount=-ESTRUSIONE_ESTRUSIONE12_DEPTH)

    # Raccordo2
    raccordo2_edges = [part.edges().sort_by_distance(p)[0] for p in [
        (4, -54, 1.5),
        (-4, -54, 1.5),
        (4, 4, 1.5),
        (-4, 4, 1.5),
    ]]
    fillet(raccordo2_edges, radius=RACCORDO2_R)

    # Schizzo20 → Taglio-Estrusione8 (cut)
    with BuildSketch(Plane(origin=(0, 0, -41), x_dir=(-1, 0, 0), z_dir=(0, 0, -1))):
        with Locations((-18, -58)):
            Circle(SCHIZZO20_R)
        with Locations((18, -58)):
            Circle(SCHIZZO20_R)
    extrude(amount=-TAGLIO_ESTRUSIONE8_DEPTH, mode=Mode.SUBTRACT)

    # Schizzo21 → Taglio-Estrusione9 (cut)
    with BuildSketch(Plane(origin=(0, 0, -45), x_dir=(-1, 0, 0), z_dir=(0, 0, -1))):
        with Locations((0, 1)):
            Rectangle(SCHIZZO21_W, SCHIZZO21_H)
    extrude(amount=-TAGLIO_ESTRUSIONE9_DEPTH, mode=Mode.SUBTRACT)

    # Smusso4
    smusso4_edges = [part.edges().sort_by_distance(p)[0] for p in [
        (-40, 4, -6),
        (40, 4, -6),
    ]]
    chamfer(smusso4_edges, length=SMUSSO4_SIZE)

    # Schizzo22 → Estrusione-Estrusione13 (add)
    with BuildSketch(Plane.XZ.offset(-59)):
        Polygon((49, 0), (30, 0), (30, -11), (44, -25), (44, -47), (49, -47), align=None)
        Polygon((-30, 0), (-49, 0), (-49, -47), (-44, -47), (-44, -25), (-30, -11), align=None)
    extrude(amount=ESTRUSIONE_ESTRUSIONE13_DEPTH)

    # Schizzo23 → Taglio-Estrusione10 (cut)
    with BuildSketch(Plane(origin=(0, 0, -47), x_dir=(-1, 0, 0), z_dir=(0, 0, -1))):
        with Locations((-46.5, 58)):
            Rectangle(SCHIZZO23_W, SCHIZZO23_H)
    extrude(amount=-TAGLIO_ESTRUSIONE10_DEPTH, mode=Mode.SUBTRACT)

    # Smusso5
    smusso5_edges = [part.edges().sort_by_distance(p)[0] for p in [
        (46.5, 59, -32),
    ]]
    chamfer(smusso5_edges, length=SMUSSO5_SIZE - 0.0001)  # a hair under: the kernel refuses the full size

    # Schizzo24 → Estrusione-Estrusione14 (add)
    with BuildSketch(Plane(origin=(0, 9, 0), x_dir=(1, 0, 0), z_dir=(0, 1, 0))):
        Polygon((-49, 0), (-30, 0), (-30, 12.76), (-44, 29), (-44, 47), (-49, 47), align=None)
        Polygon((44, 47), (49, 47), (49, 0), (30, 0), (30, 12.76), (44, 29), align=None)
    extrude(amount=ESTRUSIONE_ESTRUSIONE14_DEPTH)


solid = part.part
